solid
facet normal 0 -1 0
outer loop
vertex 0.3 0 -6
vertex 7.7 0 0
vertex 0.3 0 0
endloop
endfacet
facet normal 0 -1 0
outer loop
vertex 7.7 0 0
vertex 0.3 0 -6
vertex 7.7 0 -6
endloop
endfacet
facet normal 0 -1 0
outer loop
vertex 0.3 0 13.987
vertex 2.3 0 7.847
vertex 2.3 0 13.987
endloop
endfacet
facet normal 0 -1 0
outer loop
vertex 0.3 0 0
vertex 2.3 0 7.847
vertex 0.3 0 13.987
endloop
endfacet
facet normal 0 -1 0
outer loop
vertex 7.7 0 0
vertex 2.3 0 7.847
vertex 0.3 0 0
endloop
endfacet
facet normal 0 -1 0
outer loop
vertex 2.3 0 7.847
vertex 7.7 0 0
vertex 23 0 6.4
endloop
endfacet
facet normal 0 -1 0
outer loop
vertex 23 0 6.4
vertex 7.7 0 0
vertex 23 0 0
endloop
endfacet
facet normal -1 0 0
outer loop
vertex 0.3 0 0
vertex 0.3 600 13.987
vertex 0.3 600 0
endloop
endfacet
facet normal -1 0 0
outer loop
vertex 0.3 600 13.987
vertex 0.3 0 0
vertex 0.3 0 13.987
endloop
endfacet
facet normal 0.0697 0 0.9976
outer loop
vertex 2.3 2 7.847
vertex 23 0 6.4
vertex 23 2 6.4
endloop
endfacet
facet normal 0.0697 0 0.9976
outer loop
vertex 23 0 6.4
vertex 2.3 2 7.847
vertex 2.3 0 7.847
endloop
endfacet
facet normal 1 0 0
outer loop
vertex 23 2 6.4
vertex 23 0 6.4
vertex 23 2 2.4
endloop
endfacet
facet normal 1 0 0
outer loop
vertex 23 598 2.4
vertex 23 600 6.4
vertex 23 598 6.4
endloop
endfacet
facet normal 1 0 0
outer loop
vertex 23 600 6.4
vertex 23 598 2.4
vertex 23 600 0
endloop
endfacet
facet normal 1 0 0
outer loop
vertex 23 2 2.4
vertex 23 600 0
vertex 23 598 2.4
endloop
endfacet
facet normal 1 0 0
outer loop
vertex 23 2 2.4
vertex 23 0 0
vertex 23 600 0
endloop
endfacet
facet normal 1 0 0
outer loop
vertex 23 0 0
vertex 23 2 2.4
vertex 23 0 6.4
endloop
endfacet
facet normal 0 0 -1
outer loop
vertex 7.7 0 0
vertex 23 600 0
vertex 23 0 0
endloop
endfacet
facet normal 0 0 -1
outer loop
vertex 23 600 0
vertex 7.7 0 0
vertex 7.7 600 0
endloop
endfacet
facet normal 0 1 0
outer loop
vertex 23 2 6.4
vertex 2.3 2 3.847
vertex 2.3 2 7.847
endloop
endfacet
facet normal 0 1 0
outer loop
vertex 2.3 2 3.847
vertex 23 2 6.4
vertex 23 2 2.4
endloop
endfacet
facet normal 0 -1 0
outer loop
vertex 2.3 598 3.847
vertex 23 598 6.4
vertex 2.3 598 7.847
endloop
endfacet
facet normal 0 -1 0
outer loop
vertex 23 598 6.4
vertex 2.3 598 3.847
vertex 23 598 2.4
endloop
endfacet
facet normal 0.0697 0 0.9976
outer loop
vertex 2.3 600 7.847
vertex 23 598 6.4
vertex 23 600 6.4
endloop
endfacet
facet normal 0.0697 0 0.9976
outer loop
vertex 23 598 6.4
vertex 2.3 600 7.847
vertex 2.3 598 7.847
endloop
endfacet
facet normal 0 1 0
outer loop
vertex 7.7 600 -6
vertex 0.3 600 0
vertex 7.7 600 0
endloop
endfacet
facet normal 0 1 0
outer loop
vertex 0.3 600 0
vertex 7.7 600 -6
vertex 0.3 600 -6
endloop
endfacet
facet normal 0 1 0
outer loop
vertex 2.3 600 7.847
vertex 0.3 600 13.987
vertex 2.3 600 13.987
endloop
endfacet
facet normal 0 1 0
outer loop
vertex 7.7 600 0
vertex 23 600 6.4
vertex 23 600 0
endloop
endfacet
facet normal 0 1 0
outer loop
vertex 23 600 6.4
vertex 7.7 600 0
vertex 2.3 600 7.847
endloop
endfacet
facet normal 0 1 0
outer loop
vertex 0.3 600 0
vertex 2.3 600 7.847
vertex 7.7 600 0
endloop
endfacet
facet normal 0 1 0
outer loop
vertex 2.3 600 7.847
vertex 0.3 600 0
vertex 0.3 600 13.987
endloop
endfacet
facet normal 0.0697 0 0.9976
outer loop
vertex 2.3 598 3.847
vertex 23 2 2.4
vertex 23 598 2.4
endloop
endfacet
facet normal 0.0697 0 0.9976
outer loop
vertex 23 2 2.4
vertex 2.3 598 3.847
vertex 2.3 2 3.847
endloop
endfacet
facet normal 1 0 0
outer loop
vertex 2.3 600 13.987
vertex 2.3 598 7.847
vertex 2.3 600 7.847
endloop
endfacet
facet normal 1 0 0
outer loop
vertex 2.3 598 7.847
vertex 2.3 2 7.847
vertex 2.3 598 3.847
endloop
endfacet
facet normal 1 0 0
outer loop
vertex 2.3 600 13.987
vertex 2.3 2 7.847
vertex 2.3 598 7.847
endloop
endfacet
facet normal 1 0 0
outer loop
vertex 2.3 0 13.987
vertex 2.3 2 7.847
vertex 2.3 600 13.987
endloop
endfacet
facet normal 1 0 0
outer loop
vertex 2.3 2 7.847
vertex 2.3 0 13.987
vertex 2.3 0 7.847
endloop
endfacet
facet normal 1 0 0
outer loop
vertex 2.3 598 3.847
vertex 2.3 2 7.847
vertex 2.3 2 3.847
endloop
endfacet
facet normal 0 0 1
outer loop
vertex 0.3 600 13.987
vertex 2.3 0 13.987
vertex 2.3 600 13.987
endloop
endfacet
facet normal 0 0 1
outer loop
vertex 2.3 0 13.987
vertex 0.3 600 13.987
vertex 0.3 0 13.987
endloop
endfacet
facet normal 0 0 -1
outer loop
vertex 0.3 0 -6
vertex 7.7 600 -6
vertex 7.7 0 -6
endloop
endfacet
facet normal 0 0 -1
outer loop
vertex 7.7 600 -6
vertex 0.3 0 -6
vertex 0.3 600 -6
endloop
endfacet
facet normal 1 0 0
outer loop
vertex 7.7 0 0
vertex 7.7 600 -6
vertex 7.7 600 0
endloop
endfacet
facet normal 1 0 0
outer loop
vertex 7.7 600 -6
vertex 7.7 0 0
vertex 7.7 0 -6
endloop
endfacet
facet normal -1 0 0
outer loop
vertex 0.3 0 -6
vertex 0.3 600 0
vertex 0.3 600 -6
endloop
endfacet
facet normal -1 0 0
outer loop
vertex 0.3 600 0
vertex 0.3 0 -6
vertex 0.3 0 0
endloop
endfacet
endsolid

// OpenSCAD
// file: ../../lib/makeit.scad
// Shared helpers for makeit models. Use with: use <../../lib/makeit.scad>
// Conventions: millimetres; x/y/z of the *installed* part, z up.

// Keep only the part of children() with y in [y0, y1].
module keep_y(y0, y1, big = 2000) {
    intersection() {
        children();
        translate([-big / 2, y0, -big / 2]) cube([big, y1 - y0, big]);
    }
}

// Piece `index` (0-based) of `count` equal cuts along y, for parts longer
// than the print bed. index < 0 keeps the whole part.
module segment_y(length, count, index) {
    if (count <= 1 || index < 0) children();
    else keep_y(length / count * index, length / count * (index + 1)) children();
}

// Short test-fit slice from the y=0 end (0 = off), else the chosen segment.
// The build sets $section_at (0..1 along y) to render a thin cross-section
// for the profile view.
module print_cut(length, test_slice = 0, segments = 1, segment = -1) {
    if (!is_undef($section_at)) keep_y(length * $section_at, length * $section_at + 0.5) children();
    else if (test_slice > 0) keep_y(0, test_slice) children();
    else segment_y(length, segments, segment) children();
}
// main file
// Sink-to-wall gap cover: a strip that sits on the back rim of the sink,
// keys into the gap with a tab, rises against the wall with an upstand, and
// slopes so splashes drain back into the sink instead of down the gap.
//
// Installed frame: x = from the wall toward the sink (wall face at x=0),
// y = along the wall, z = up with z=0 at the top of the sink rim.
use <../../lib/makeit.scad>

/* [Measured] */
length = 600;          // PLACEHOLDER: along the wall, edge to edge of the sink rim
gap_left = 8;          // PLACEHOLDER: wall to rim edge at y=0
gap_right = 8;         // PLACEHOLDER: wall to rim edge at y=length
rim_overlap = 15;      // how far onto the rim the cover reaches (keep < flat part of rim)

/* [Design] */
thickness = 2.4;       // plate thickness at the sink edge (thinnest point)
slope_deg = 4;         // fall toward the sink
upstand_height = 10;   // lip against the wall, above the sloped top
upstand_thickness = 2;
tab_depth = 6;         // how far the locating tab drops into the gap
end_dams = true;       // short walls at both ends so water can't run off sideways
dam_height = 4;        // above the sloped top
dam_thickness = 2;

/* [Print] */
clearance = 0.3;       // per side: off the wall and inside the gap
test_slice = 0;        // >0: only the first N mm from the y=0 end
segments = 1;          // split along y when longer than the bed
segment = -1;          // which piece to export, -1 = all
orient = "installed";  // "print" lays it on its wall-side face: no supports

gap_max = max(gap_left, gap_right);
x0 = clearance;                      // back (wall-side) face
x1 = gap_max + rim_overlap;          // front edge over the sink
fall = tan(slope_deg);
function top_z(x) = thickness + (x1 - x) * fall;

assert(min(gap_left, gap_right) - 2 * clearance >= 1,
       "gap too narrow for a tab: lower clearance or set tab_depth = 0");

// Constant cross-section (x, z), extruded along y.
module extrude_y(len) {
    translate([0, len, 0]) rotate([90, 0, 0]) linear_extrude(len) children();
}

module body() {
    xu = x0 + upstand_thickness;
    extrude_y(length) polygon([
        [x0, 0], [x1, 0], [x1, thickness],
        [xu, top_z(xu)], [xu, top_z(x0) + upstand_height], [x0, top_z(x0) + upstand_height],
    ]);
}

module tab() {
    if (tab_depth > 0) hull() {
        translate([x0, 0, -tab_depth]) cube([gap_left - 2 * clearance, 0.01, tab_depth + thickness / 2]);
        translate([x0, length - 0.01, -tab_depth]) cube([gap_right - 2 * clearance, 0.01, tab_depth + thickness / 2]);
    }
}

module dam_profile() {
    polygon([[x0, 0], [x1, 0], [x1, top_z(x1) + dam_height], [x0, top_z(x0) + dam_height]]);
}

module dams() {
    if (end_dams) {
        extrude_y(dam_thickness) dam_profile();
        translate([0, length - dam_thickness, 0]) extrude_y(dam_thickness) dam_profile();
    }
}

module part() { union() { body(); tab(); dams(); } }

// Wall and sink rim, for previews only.
module context() {
    translate([-8, 0, -15]) cube([8, length, 45]);                    // wall
    translate([gap_left, 0, -15]) cube([x1 - gap_left + 10, length, 15]); // rim, simplified
}

if (orient == "print") {
    // Wall-side face down: every layer is a subset of the one below it.
    translate([0, 0, -x0]) rotate([0, -90, 0])
        print_cut(length, test_slice, segments, segment) part();
} else {
    %print_cut(length, test_slice, segments, segment) context();
    print_cut(length, test_slice, segments, segment) part();
}
